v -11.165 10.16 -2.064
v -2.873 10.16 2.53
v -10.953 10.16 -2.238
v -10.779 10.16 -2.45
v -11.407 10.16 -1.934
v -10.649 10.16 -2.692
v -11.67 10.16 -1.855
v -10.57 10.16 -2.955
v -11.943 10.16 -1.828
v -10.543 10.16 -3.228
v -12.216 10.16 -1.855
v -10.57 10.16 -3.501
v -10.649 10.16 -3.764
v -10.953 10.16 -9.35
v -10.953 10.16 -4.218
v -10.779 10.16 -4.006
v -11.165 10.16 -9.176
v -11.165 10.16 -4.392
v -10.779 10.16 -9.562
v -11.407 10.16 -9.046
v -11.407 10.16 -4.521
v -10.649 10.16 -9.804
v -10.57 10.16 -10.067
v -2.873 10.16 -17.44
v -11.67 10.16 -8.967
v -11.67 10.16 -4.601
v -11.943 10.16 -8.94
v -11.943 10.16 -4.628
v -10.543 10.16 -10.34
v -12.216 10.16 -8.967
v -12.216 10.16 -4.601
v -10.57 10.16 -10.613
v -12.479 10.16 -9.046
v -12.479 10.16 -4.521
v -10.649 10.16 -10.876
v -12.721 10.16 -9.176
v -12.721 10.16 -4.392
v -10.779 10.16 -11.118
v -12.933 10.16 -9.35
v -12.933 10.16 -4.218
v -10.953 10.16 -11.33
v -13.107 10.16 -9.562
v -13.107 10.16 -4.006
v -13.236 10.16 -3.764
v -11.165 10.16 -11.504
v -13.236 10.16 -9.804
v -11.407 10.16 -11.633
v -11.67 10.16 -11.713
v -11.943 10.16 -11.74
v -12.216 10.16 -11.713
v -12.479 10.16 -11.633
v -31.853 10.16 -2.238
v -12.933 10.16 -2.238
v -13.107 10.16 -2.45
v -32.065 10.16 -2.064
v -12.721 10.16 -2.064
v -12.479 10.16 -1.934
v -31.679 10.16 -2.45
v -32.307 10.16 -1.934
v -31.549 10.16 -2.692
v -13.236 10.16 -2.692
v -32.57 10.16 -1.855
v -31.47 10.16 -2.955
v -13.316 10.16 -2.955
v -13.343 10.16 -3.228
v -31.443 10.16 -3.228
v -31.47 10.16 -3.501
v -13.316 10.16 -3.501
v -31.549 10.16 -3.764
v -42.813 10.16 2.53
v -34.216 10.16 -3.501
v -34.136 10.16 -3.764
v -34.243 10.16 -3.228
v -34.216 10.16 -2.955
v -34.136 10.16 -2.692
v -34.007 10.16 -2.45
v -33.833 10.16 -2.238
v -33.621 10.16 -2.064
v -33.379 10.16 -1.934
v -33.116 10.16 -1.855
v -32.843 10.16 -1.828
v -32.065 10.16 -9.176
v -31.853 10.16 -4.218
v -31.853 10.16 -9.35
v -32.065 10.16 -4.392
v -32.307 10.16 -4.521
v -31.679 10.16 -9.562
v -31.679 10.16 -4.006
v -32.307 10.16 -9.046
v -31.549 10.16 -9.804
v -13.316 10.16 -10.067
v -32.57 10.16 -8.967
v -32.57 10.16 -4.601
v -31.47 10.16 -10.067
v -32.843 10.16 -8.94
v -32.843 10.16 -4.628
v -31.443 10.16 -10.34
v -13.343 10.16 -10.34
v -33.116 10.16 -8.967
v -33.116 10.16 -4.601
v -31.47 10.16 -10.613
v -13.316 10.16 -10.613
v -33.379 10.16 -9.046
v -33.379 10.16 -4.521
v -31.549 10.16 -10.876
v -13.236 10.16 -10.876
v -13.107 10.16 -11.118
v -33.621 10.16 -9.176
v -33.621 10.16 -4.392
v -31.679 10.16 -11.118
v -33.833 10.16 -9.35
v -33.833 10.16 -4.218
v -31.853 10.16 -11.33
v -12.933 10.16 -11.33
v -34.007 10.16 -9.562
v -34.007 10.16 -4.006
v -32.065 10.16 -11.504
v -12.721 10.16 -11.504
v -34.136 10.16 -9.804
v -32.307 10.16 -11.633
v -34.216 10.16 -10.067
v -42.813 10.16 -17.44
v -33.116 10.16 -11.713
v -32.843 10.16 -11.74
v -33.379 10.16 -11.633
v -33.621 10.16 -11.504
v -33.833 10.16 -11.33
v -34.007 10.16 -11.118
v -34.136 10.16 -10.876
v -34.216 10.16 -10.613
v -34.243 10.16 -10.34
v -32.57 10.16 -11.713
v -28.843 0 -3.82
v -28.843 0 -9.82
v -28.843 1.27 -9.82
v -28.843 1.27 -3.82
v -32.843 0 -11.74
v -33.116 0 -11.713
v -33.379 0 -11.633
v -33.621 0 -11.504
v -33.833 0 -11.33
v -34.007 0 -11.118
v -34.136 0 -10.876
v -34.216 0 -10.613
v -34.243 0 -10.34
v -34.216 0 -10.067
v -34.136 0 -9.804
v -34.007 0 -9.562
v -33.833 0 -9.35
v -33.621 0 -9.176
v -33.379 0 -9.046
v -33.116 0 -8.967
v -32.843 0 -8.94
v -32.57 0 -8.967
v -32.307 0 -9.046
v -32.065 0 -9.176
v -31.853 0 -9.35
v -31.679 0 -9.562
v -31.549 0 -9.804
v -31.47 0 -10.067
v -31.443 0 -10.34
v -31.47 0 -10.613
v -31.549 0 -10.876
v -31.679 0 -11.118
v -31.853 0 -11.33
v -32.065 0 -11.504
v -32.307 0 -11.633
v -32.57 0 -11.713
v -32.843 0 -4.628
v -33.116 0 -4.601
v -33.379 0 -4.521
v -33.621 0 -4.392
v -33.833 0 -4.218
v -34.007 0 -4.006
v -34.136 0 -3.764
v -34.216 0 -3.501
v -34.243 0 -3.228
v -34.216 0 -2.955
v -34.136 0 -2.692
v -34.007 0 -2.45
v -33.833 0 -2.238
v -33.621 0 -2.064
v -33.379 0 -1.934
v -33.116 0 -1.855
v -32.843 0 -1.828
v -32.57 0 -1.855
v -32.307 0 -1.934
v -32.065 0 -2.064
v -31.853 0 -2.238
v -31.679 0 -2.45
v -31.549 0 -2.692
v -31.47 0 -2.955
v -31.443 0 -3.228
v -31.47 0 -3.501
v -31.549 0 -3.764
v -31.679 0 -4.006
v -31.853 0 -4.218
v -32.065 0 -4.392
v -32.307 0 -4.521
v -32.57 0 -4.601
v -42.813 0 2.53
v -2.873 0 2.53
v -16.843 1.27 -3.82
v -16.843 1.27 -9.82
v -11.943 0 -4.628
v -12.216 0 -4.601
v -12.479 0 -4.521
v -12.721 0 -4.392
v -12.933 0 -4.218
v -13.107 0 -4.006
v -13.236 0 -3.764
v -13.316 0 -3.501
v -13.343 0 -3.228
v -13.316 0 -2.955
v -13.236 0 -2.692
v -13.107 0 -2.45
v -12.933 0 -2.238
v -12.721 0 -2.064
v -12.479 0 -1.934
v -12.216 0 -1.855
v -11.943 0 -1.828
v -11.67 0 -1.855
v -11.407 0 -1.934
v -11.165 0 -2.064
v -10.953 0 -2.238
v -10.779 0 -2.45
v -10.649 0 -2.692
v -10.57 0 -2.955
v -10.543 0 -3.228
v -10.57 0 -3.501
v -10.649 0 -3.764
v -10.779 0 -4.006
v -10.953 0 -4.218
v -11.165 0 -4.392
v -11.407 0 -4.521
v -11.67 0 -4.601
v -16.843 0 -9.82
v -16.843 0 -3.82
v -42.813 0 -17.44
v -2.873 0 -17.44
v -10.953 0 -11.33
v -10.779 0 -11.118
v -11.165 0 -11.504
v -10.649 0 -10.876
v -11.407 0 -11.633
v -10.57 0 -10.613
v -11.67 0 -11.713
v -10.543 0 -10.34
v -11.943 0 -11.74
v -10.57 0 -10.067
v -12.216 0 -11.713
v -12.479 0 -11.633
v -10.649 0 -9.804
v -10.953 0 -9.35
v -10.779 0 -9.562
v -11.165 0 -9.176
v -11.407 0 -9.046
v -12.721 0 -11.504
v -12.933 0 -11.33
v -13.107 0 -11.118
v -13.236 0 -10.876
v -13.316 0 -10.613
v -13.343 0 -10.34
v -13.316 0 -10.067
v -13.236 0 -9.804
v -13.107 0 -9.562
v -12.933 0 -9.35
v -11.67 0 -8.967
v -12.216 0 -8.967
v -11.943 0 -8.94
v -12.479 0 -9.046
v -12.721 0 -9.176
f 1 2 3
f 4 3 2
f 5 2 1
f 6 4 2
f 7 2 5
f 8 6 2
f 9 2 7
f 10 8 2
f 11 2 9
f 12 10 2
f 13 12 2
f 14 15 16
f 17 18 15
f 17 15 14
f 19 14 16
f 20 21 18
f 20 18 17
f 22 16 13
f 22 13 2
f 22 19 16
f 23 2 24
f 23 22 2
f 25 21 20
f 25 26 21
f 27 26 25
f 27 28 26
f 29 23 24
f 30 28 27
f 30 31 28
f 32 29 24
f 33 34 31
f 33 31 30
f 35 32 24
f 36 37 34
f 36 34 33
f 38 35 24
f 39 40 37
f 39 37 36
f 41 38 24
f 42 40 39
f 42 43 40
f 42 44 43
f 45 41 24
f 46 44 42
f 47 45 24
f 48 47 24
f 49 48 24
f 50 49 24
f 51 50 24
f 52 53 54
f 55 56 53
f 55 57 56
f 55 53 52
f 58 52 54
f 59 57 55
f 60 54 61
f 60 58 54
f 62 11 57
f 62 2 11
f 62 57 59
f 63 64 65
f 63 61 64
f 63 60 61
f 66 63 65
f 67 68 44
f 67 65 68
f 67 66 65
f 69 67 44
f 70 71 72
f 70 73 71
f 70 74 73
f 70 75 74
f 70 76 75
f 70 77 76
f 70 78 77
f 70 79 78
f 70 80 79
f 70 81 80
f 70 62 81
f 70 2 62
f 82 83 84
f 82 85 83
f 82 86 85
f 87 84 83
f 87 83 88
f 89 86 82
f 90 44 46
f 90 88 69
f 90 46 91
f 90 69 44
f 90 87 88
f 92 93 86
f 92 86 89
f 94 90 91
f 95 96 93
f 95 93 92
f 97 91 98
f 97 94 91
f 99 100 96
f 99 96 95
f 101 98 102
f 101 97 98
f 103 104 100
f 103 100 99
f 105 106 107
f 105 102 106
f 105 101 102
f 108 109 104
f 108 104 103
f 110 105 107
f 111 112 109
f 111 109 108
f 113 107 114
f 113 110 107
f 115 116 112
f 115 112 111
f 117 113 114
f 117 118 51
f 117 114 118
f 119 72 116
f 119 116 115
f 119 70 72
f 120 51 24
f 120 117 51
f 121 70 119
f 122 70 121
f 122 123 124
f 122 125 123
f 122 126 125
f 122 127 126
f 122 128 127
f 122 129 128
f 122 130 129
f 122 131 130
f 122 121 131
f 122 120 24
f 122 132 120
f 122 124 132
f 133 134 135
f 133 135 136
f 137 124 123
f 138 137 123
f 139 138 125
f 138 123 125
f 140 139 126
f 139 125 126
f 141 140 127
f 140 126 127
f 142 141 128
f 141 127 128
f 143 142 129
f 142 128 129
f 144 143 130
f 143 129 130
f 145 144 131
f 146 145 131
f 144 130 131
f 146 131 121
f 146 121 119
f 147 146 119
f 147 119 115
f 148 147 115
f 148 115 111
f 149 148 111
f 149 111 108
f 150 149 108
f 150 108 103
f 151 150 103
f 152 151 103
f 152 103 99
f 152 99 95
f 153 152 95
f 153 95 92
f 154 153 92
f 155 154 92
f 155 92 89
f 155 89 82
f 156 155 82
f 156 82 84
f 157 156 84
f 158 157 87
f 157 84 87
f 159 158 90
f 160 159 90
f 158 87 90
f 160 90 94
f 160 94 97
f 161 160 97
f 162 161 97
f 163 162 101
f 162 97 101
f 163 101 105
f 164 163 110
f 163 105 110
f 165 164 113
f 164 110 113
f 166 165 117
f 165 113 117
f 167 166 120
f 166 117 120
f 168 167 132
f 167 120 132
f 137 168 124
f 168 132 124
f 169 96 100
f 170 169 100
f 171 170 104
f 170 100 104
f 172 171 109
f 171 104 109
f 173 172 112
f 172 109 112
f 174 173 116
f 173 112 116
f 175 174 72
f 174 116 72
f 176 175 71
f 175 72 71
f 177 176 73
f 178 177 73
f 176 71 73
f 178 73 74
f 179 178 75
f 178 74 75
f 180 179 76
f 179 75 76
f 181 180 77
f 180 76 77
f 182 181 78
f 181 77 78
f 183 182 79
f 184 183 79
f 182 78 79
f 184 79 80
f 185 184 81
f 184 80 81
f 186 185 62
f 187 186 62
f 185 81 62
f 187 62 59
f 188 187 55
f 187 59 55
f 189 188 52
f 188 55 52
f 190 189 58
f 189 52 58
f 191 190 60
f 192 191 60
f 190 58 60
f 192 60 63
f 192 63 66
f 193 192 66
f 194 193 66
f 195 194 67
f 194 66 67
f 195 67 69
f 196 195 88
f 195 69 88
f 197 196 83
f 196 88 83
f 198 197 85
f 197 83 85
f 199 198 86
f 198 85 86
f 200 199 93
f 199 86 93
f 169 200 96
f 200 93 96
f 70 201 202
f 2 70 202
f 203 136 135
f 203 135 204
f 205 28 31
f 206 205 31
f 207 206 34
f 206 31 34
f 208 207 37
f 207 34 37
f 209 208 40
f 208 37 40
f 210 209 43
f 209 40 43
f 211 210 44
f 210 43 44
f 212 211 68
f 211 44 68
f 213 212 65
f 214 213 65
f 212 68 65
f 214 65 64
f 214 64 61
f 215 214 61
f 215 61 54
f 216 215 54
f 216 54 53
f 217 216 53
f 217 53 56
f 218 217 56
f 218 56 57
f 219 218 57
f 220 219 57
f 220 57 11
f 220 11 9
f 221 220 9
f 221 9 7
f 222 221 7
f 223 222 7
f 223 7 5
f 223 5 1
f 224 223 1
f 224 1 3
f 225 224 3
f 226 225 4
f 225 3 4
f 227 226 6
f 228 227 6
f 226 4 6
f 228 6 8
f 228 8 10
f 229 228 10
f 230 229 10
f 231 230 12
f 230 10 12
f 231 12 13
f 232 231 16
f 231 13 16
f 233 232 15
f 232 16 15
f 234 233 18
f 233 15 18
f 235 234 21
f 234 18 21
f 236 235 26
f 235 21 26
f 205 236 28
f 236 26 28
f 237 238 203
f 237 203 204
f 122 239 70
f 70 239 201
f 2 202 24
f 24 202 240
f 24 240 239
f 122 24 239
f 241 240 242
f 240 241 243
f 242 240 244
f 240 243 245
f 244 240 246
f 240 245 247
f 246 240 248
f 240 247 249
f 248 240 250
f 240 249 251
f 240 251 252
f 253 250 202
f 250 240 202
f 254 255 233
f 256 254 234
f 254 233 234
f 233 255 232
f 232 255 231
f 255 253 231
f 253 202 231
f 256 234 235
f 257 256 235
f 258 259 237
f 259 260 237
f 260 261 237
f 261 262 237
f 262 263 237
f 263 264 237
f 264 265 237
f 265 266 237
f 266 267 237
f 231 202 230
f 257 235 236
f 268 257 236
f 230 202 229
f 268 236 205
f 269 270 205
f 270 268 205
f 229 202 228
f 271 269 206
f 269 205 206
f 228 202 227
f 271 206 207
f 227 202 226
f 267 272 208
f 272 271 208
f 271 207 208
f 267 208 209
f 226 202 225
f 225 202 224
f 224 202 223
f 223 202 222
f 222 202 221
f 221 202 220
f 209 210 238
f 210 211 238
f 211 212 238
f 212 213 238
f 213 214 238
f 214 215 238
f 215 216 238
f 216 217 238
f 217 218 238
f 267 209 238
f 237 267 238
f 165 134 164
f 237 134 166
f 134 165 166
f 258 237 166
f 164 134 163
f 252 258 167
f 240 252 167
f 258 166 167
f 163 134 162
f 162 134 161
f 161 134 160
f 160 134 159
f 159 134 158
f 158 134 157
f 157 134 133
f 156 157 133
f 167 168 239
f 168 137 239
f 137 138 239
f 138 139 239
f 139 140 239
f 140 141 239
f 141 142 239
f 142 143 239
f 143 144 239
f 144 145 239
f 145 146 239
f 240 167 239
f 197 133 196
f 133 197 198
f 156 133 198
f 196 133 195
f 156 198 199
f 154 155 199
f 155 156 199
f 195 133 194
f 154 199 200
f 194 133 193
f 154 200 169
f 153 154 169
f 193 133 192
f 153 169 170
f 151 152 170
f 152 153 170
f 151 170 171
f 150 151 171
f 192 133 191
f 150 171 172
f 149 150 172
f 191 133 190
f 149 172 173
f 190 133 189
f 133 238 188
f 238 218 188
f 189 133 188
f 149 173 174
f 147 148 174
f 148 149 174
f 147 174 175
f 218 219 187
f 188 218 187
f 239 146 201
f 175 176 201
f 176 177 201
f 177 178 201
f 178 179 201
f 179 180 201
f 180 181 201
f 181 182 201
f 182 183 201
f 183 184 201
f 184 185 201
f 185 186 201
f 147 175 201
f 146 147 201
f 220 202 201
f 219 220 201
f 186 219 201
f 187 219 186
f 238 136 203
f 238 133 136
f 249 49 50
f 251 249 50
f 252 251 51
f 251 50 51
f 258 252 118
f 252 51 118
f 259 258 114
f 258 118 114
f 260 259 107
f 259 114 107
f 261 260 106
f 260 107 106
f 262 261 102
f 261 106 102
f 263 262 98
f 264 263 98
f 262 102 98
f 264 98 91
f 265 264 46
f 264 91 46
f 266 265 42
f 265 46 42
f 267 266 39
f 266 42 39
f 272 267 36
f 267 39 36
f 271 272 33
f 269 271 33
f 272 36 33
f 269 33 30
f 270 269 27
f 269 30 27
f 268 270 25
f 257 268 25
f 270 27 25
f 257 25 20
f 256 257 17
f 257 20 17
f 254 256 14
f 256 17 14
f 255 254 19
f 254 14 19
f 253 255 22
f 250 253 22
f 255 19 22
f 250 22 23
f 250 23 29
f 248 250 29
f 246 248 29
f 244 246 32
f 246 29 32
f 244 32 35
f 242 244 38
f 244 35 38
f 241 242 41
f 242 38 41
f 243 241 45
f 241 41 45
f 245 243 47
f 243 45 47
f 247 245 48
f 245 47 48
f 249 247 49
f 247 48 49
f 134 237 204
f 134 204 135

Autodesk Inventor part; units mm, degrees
ref_plane "YZ Plane" through (0, 0, 0) normal (1, 0, 0) x (0, 1, 0)
ref_plane "XZ Plane" through (0, 0, 0) normal (0, 1, 0) x (-1, 0, 0)
ref_plane "XY Plane" through (0, 0, 0) normal (0, 0, 1) x (1, 0, 0)
sketch "Sketch1" plane through (0, 0, 0) normal (0, 1, 0) x (-1, 0, 0)
  line L0 (46.6228, 34.6302) -> (-74.0272, 34.6302)
  line L1 (-74.0272, 34.6302) -> (-74.0272, -54.2698)
  line L2 (-74.0272, -54.2698) -> (46.6228, -54.2698)
  line L3 (46.6228, -54.2698) -> (46.6228, 34.6302)
  point P0 (0, 0)
  dimension "d0" = 120.65
  dimension "d1" = 88.9
extrude "Extrusion1" add sketch "Sketch1" along normal blind 12.7
sketch "Sketch2" plane through (0, 12.7, 0) normal (0, 1, 0) x (1, 0, 0)
  line L0 (-46.6228, -34.6302) -> (74.0272, -34.6302) projected
  line L1 (-46.6228, 54.2698) -> (-46.6228, -34.6302) projected
  point P0 (0, 0)
  point P1 (6.7172, -29.5502)
  point P2 (51.1672, -29.5502)
  dimension "d4" = 0
  dimension "d5" = 5.08
  dimension "d6" = 53.34
  dimension "d7" = 44.45
hole "Hole1" at (6.7172, 12.7, 29.5502) at (51.1672, 12.7, 29.5502) direction (0, -1, 0) diameter 4.826 depth 25.4 tip angle 118 countersink diameter 9.525 countersink angle 82
sketch "Sketch10" plane through (0, 12.7, 0) normal (0, 1, 0) x (1, 0, 0)
  circle A0 centre (51.1672, -29.5502) radius 2.413 projected
  circle A1 centre (6.7172, -29.5502) radius 2.413 projected
  line L0 (74.0272, 54.2698) -> (-46.6228, 54.2698) projected
  point P0 (0, 0)
  point P1 (6.7172, 14.2648)
  point P2 (51.1672, 14.2648)
  point P3 (66.6772, 28.8698)
  point P4 (-45.6228, 28.8698)
  point P5 (-46.6228, 54.2698)
  dimension "d80" = 0
  dimension "d81" = 0
  dimension "d82" = 0
  dimension "d144" = 43.815
hole "Hole7" at (6.7172, 12.7, -14.2648) at (51.1672, 12.7, -14.2648) direction (0, -1, 0) diameter 4.826 end through all countersink diameter 9.525 countersink angle 82
sketch "Sketch11" plane through (0, 0, 0) normal (0, -1, 0) x (1, 0, 0)
  line L0 (-28.8428, 29.2002) -> (-16.8428, 29.2002)
  line L1 (-16.8428, 29.2002) -> (-16.8428, 23.2002)
  line L2 (-16.8428, 23.2002) -> (-28.8428, 23.2002)
  line L3 (-28.8428, 23.2002) -> (-28.8428, 29.2002)
  line L4 (-28.8428, -3.8198) -> (-16.8428, -3.8198)
  line L5 (-16.8428, -3.8198) -> (-16.8428, -9.8198)
  line L6 (-16.8428, -9.8198) -> (-28.8428, -9.8198)
  line L7 (-28.8428, -9.8198) -> (-28.8428, -3.8198)
  line L8 (-28.8428, 23.5502) -> (-28.8428, 29.5502) projected
  line L9 (-16.8428, 29.5502) -> (-16.8428, 23.5502) projected
  line L10 (74.0272, -54.2698) -> (-46.6228, -54.2698) projected
  point P0 (0, 0)
  dimension "d93" = 0
  dimension "d94" = 0
  dimension "d95" = 0
  dimension "d96" = 0
  dimension "d97" = 6
  dimension "d98" = 6
  dimension "d99" = 44.45
  dimension "d100" = 77.47
extrude "Extrusion4" cut sketch "Sketch11" against normal blind 1.27
sketch "Sketch13" plane through (0, 0, 0) normal (0, -1, 0) x (1, 0, 0)
  circle A0 centre (-32.8428, -42.0898) radius 1.4 projected
  circle A1 centre (-32.8428, -49.1898) radius 1.4 projected
  line L0 (-46.6228, 34.6302) -> (74.0272, 34.6302) projected
  circle A2 centre (-11.9428, -42.0898) radius 1.4 projected
  point P0 (0, 0)
  point P1 (-32.8428, -10.3398)
  point P2 (-32.8428, -3.2278)
  point P3 (-32.8428, 22.9462)
  point P4 (-32.8428, 30.0582)
  point P5 (-39.7887, 34.6302)
  point P6 (67.4471, 34.6302)
  point P7 (-11.9428, -10.3398)
  point P8 (-11.9428, -3.2278)
  point P9 (-11.9428, 22.9462)
  point P10 (-11.9428, 30.0582)
  dimension "d110" = 0
  dimension "d111" = 0
  dimension "d112" = 0
  dimension "d113" = 7.112
  dimension "d114" = 7.112
  dimension "d115" = 31.75
  dimension "d116" = 4.572
  dimension "d117" = 0
  dimension "d118" = 0
  dimension "d119" = 0
  dimension "d120" = 0
  dimension "d121" = 0
  dimension "d122" = 0
  dimension "d123" = 0
  dimension "d124" = 0
hole "Hole9" at (-32.8428, 0, -10.3398) at (-32.8428, 0, -3.2278) at (-32.8428, 0, 22.9462) at (-32.8428, 0, 30.0582) at (-11.9428, 0, -10.3398) at (-11.9428, 0, -3.2278) at (-11.9428, 0, 22.9462) at (-11.9428, 0, 30.0582) direction (0, 1, 0) diameter 2.8 end through all
sketch "Sketch15" plane through (0, 12.7, 0) normal (0, 1, 0) x (1, 0, 0)
  circle A0 centre (6.7172, 14.2648) radius 2.413 projected
  circle A1 centre (51.1672, 14.2648) radius 2.413 projected
  circle A2 centre (6.7172, -29.5502) radius 2.413 projected
  circle A3 centre (51.1672, -29.5502) radius 2.413 projected
  circle A4 centre (6.7172, 14.2648) radius 3.3734
  circle A5 centre (6.7172, -29.5502) radius 3.3734
  circle A6 centre (51.1672, -29.5502) radius 3.3734
  circle A7 centre (51.1672, 14.2648) radius 3.3734
  point P0 (0, 0)
  dimension "d138" = 6.7469
  dimension "d139" = 6.7469
  dimension "d140" = 6.7469
  dimension "d141" = 6.7469
extrude "Extrusion6" cut sketch "Sketch15" against normal blind 8.89
sketch "Sketch16" plane through (0, 0, 0) normal (0, -1, 0) x (1, 0, 0)
  line L0 (-64.483, -21.2498) -> (91.0848, -21.2498)
  line L1 (91.0848, -21.2498) -> (91.0848, -72.9236)
  line L2 (91.0848, -72.9236) -> (-64.483, -72.9236)
  line L3 (-64.483, -72.9236) -> (-64.483, -21.2498)
  line L4 (74.0272, -54.2698) -> (-46.6228, -54.2698) projected
  point P0 (0, 0)
  dimension "d145" = 33.02
extrude "Extrusion7" cut sketch "Sketch16" against normal blind 25.4
sketch "Sketch17" plane through (0, 12.7, 0) normal (0, 1, 0) x (1, 0, 0)
  line L0 (0.9372, 34.8895) -> (84.6395, 34.8895)
  line L1 (84.6395, 34.8895) -> (84.6395, -45.0892)
  line L2 (84.6395, -45.0892) -> (0.9372, -45.0892)
  line L3 (-16.8428, 3.8198) -> (-16.8428, 9.8198) projected
  line L4 (-46.6228, 21.2498) -> (-46.6228, -34.6302) projected
  line L5 (-28.8428, 9.8198) -> (-28.8428, 3.8198) projected
  line L6 (74.0272, 21.2498) -> (-46.6228, 21.2498) projected
  line L7 (-16.8428, 9.8198) -> (-28.8428, 9.8198) projected
  line L8 (-60.5333, -6.3402) -> (0.9372, -6.3402)
  line L9 (0.9372, -39.753) -> (-60.5333, -39.753)
  line L10 (-60.5333, -39.753) -> (-60.5333, -6.3402)
  line L11 (0.9372, -45.0892) -> (0.9372, -39.753)
  line L12 (0.9372, -6.3402) -> (0.9372, 34.8895)
  line L13 (-28.8428, 3.8198) -> (-16.8428, 3.8198) projected
  point P0 (0, 0)
  dimension "d149" = 17.78
  dimension "d150" = 11.43
  dimension "d151" = 10.16
extrude "Extrusion8" cut sketch "Sketch17" against normal blind 25.4 contours L0 L1 L2 L11 L9 L10 L8 L12
sketch "Sketch18" plane through (-46.6228, 0, -21.2498) normal (-1, 0, 0) x (0, 0, 1)
  line L0 (37.4692, 10.16) -> (-18.1099, 10.16)
  line L1 (-18.1099, 10.16) -> (-18.1099, 19.4846)
  line L2 (-18.1099, 19.4846) -> (37.4692, 19.4846)
  line L3 (37.4692, 19.4846) -> (37.4692, 10.16)
  line L4 (0, 12.7) -> (27.59, 12.7) projected
  point P0 (21.2498, 0)
  dimension "d154" = 2.54
extrude "Extrusion9" cut sketch "Sketch18" against normal blind 55.5625
sketch "Sketch19" plane through (0, 0, 0) normal (0, -1, 0) x (1, 0, 0)
  circle A0 centre (-11.9428, -10.3398) radius 1.4 projected
  circle A1 centre (-32.8428, -10.3398) radius 1.4 projected
  circle A2 centre (-32.8428, -3.2278) radius 1.4 projected
  circle A3 centre (-11.9428, -3.2278) radius 1.4 projected
  line L0 (-28.8428, -9.8198) -> (-28.8428, -3.8198) projected
  line L1 (-28.8428, -3.8198) -> (-16.8428, -3.8198) projected
  line L2 (-16.8428, -3.8198) -> (-16.8428, -9.8198) projected
  line L3 (-16.8428, -9.8198) -> (-28.8428, -9.8198) projected
  line L4 (0.9372, -21.2498) -> (0.9372, 6.3402) projected
  line L5 (0.9372, 6.3402) -> (-46.6228, 6.3402) projected
  line L6 (-46.6228, -21.2498) -> (-46.6228, 6.3402) projected
  line L7 (-46.6228, -21.2498) -> (0.9372, -21.2498) projected
  line L8 (0.9372, -21.2498) -> (0.9372, 6.3402) projected
  line L9 (-46.6228, -21.2498) -> (0.9372, -21.2498) projected
  line L10 (-46.6228, -21.2498) -> (-46.6228, 6.3402) projected
  line L11 (-42.8128, 2.5302) -> (-2.8728, 2.5302)
  line L12 (-2.8728, 2.5302) -> (-2.8728, -17.4398)
  line L13 (-2.8728, -17.4398) -> (-42.8128, -17.4398)
  line L14 (-42.8128, -17.4398) -> (-42.8128, 2.5302)
  point P0 (0, 0)
  dimension "d157" = 3.81
  dimension "d158" = 3.81
  dimension "d159" = 3.81
  dimension "d160" = 3.81
extrude "Extrusion10" cut sketch "Sketch19" against normal blind 55.5625 contours L7 L6 L5 L4
equation "\"d125\" = CanConHoleDiam"
equation "\"LegoMainHole\" = 4.8"
equation "\"TalonSRXWidth\" = 31.75"
equation "\"TalonSRXFromSide\" = 15.875"
equation "\"TalonSRXBetweenHoles\" = 50.8"
equation "\"CanConPinWidth\" = 6"
equation "\"CanConPinLength\" = 12"
equation "\"CanConBetweenSideHoles\" = 20.9"
equation "\"CanConBetweenTopHoles\" = 7.1"
equation "\"CanConHoleDiam\" = 2.8"
equation "\"CanConHoleFromTopPin\" = 4"
properties part number "CANConnectorOne"
